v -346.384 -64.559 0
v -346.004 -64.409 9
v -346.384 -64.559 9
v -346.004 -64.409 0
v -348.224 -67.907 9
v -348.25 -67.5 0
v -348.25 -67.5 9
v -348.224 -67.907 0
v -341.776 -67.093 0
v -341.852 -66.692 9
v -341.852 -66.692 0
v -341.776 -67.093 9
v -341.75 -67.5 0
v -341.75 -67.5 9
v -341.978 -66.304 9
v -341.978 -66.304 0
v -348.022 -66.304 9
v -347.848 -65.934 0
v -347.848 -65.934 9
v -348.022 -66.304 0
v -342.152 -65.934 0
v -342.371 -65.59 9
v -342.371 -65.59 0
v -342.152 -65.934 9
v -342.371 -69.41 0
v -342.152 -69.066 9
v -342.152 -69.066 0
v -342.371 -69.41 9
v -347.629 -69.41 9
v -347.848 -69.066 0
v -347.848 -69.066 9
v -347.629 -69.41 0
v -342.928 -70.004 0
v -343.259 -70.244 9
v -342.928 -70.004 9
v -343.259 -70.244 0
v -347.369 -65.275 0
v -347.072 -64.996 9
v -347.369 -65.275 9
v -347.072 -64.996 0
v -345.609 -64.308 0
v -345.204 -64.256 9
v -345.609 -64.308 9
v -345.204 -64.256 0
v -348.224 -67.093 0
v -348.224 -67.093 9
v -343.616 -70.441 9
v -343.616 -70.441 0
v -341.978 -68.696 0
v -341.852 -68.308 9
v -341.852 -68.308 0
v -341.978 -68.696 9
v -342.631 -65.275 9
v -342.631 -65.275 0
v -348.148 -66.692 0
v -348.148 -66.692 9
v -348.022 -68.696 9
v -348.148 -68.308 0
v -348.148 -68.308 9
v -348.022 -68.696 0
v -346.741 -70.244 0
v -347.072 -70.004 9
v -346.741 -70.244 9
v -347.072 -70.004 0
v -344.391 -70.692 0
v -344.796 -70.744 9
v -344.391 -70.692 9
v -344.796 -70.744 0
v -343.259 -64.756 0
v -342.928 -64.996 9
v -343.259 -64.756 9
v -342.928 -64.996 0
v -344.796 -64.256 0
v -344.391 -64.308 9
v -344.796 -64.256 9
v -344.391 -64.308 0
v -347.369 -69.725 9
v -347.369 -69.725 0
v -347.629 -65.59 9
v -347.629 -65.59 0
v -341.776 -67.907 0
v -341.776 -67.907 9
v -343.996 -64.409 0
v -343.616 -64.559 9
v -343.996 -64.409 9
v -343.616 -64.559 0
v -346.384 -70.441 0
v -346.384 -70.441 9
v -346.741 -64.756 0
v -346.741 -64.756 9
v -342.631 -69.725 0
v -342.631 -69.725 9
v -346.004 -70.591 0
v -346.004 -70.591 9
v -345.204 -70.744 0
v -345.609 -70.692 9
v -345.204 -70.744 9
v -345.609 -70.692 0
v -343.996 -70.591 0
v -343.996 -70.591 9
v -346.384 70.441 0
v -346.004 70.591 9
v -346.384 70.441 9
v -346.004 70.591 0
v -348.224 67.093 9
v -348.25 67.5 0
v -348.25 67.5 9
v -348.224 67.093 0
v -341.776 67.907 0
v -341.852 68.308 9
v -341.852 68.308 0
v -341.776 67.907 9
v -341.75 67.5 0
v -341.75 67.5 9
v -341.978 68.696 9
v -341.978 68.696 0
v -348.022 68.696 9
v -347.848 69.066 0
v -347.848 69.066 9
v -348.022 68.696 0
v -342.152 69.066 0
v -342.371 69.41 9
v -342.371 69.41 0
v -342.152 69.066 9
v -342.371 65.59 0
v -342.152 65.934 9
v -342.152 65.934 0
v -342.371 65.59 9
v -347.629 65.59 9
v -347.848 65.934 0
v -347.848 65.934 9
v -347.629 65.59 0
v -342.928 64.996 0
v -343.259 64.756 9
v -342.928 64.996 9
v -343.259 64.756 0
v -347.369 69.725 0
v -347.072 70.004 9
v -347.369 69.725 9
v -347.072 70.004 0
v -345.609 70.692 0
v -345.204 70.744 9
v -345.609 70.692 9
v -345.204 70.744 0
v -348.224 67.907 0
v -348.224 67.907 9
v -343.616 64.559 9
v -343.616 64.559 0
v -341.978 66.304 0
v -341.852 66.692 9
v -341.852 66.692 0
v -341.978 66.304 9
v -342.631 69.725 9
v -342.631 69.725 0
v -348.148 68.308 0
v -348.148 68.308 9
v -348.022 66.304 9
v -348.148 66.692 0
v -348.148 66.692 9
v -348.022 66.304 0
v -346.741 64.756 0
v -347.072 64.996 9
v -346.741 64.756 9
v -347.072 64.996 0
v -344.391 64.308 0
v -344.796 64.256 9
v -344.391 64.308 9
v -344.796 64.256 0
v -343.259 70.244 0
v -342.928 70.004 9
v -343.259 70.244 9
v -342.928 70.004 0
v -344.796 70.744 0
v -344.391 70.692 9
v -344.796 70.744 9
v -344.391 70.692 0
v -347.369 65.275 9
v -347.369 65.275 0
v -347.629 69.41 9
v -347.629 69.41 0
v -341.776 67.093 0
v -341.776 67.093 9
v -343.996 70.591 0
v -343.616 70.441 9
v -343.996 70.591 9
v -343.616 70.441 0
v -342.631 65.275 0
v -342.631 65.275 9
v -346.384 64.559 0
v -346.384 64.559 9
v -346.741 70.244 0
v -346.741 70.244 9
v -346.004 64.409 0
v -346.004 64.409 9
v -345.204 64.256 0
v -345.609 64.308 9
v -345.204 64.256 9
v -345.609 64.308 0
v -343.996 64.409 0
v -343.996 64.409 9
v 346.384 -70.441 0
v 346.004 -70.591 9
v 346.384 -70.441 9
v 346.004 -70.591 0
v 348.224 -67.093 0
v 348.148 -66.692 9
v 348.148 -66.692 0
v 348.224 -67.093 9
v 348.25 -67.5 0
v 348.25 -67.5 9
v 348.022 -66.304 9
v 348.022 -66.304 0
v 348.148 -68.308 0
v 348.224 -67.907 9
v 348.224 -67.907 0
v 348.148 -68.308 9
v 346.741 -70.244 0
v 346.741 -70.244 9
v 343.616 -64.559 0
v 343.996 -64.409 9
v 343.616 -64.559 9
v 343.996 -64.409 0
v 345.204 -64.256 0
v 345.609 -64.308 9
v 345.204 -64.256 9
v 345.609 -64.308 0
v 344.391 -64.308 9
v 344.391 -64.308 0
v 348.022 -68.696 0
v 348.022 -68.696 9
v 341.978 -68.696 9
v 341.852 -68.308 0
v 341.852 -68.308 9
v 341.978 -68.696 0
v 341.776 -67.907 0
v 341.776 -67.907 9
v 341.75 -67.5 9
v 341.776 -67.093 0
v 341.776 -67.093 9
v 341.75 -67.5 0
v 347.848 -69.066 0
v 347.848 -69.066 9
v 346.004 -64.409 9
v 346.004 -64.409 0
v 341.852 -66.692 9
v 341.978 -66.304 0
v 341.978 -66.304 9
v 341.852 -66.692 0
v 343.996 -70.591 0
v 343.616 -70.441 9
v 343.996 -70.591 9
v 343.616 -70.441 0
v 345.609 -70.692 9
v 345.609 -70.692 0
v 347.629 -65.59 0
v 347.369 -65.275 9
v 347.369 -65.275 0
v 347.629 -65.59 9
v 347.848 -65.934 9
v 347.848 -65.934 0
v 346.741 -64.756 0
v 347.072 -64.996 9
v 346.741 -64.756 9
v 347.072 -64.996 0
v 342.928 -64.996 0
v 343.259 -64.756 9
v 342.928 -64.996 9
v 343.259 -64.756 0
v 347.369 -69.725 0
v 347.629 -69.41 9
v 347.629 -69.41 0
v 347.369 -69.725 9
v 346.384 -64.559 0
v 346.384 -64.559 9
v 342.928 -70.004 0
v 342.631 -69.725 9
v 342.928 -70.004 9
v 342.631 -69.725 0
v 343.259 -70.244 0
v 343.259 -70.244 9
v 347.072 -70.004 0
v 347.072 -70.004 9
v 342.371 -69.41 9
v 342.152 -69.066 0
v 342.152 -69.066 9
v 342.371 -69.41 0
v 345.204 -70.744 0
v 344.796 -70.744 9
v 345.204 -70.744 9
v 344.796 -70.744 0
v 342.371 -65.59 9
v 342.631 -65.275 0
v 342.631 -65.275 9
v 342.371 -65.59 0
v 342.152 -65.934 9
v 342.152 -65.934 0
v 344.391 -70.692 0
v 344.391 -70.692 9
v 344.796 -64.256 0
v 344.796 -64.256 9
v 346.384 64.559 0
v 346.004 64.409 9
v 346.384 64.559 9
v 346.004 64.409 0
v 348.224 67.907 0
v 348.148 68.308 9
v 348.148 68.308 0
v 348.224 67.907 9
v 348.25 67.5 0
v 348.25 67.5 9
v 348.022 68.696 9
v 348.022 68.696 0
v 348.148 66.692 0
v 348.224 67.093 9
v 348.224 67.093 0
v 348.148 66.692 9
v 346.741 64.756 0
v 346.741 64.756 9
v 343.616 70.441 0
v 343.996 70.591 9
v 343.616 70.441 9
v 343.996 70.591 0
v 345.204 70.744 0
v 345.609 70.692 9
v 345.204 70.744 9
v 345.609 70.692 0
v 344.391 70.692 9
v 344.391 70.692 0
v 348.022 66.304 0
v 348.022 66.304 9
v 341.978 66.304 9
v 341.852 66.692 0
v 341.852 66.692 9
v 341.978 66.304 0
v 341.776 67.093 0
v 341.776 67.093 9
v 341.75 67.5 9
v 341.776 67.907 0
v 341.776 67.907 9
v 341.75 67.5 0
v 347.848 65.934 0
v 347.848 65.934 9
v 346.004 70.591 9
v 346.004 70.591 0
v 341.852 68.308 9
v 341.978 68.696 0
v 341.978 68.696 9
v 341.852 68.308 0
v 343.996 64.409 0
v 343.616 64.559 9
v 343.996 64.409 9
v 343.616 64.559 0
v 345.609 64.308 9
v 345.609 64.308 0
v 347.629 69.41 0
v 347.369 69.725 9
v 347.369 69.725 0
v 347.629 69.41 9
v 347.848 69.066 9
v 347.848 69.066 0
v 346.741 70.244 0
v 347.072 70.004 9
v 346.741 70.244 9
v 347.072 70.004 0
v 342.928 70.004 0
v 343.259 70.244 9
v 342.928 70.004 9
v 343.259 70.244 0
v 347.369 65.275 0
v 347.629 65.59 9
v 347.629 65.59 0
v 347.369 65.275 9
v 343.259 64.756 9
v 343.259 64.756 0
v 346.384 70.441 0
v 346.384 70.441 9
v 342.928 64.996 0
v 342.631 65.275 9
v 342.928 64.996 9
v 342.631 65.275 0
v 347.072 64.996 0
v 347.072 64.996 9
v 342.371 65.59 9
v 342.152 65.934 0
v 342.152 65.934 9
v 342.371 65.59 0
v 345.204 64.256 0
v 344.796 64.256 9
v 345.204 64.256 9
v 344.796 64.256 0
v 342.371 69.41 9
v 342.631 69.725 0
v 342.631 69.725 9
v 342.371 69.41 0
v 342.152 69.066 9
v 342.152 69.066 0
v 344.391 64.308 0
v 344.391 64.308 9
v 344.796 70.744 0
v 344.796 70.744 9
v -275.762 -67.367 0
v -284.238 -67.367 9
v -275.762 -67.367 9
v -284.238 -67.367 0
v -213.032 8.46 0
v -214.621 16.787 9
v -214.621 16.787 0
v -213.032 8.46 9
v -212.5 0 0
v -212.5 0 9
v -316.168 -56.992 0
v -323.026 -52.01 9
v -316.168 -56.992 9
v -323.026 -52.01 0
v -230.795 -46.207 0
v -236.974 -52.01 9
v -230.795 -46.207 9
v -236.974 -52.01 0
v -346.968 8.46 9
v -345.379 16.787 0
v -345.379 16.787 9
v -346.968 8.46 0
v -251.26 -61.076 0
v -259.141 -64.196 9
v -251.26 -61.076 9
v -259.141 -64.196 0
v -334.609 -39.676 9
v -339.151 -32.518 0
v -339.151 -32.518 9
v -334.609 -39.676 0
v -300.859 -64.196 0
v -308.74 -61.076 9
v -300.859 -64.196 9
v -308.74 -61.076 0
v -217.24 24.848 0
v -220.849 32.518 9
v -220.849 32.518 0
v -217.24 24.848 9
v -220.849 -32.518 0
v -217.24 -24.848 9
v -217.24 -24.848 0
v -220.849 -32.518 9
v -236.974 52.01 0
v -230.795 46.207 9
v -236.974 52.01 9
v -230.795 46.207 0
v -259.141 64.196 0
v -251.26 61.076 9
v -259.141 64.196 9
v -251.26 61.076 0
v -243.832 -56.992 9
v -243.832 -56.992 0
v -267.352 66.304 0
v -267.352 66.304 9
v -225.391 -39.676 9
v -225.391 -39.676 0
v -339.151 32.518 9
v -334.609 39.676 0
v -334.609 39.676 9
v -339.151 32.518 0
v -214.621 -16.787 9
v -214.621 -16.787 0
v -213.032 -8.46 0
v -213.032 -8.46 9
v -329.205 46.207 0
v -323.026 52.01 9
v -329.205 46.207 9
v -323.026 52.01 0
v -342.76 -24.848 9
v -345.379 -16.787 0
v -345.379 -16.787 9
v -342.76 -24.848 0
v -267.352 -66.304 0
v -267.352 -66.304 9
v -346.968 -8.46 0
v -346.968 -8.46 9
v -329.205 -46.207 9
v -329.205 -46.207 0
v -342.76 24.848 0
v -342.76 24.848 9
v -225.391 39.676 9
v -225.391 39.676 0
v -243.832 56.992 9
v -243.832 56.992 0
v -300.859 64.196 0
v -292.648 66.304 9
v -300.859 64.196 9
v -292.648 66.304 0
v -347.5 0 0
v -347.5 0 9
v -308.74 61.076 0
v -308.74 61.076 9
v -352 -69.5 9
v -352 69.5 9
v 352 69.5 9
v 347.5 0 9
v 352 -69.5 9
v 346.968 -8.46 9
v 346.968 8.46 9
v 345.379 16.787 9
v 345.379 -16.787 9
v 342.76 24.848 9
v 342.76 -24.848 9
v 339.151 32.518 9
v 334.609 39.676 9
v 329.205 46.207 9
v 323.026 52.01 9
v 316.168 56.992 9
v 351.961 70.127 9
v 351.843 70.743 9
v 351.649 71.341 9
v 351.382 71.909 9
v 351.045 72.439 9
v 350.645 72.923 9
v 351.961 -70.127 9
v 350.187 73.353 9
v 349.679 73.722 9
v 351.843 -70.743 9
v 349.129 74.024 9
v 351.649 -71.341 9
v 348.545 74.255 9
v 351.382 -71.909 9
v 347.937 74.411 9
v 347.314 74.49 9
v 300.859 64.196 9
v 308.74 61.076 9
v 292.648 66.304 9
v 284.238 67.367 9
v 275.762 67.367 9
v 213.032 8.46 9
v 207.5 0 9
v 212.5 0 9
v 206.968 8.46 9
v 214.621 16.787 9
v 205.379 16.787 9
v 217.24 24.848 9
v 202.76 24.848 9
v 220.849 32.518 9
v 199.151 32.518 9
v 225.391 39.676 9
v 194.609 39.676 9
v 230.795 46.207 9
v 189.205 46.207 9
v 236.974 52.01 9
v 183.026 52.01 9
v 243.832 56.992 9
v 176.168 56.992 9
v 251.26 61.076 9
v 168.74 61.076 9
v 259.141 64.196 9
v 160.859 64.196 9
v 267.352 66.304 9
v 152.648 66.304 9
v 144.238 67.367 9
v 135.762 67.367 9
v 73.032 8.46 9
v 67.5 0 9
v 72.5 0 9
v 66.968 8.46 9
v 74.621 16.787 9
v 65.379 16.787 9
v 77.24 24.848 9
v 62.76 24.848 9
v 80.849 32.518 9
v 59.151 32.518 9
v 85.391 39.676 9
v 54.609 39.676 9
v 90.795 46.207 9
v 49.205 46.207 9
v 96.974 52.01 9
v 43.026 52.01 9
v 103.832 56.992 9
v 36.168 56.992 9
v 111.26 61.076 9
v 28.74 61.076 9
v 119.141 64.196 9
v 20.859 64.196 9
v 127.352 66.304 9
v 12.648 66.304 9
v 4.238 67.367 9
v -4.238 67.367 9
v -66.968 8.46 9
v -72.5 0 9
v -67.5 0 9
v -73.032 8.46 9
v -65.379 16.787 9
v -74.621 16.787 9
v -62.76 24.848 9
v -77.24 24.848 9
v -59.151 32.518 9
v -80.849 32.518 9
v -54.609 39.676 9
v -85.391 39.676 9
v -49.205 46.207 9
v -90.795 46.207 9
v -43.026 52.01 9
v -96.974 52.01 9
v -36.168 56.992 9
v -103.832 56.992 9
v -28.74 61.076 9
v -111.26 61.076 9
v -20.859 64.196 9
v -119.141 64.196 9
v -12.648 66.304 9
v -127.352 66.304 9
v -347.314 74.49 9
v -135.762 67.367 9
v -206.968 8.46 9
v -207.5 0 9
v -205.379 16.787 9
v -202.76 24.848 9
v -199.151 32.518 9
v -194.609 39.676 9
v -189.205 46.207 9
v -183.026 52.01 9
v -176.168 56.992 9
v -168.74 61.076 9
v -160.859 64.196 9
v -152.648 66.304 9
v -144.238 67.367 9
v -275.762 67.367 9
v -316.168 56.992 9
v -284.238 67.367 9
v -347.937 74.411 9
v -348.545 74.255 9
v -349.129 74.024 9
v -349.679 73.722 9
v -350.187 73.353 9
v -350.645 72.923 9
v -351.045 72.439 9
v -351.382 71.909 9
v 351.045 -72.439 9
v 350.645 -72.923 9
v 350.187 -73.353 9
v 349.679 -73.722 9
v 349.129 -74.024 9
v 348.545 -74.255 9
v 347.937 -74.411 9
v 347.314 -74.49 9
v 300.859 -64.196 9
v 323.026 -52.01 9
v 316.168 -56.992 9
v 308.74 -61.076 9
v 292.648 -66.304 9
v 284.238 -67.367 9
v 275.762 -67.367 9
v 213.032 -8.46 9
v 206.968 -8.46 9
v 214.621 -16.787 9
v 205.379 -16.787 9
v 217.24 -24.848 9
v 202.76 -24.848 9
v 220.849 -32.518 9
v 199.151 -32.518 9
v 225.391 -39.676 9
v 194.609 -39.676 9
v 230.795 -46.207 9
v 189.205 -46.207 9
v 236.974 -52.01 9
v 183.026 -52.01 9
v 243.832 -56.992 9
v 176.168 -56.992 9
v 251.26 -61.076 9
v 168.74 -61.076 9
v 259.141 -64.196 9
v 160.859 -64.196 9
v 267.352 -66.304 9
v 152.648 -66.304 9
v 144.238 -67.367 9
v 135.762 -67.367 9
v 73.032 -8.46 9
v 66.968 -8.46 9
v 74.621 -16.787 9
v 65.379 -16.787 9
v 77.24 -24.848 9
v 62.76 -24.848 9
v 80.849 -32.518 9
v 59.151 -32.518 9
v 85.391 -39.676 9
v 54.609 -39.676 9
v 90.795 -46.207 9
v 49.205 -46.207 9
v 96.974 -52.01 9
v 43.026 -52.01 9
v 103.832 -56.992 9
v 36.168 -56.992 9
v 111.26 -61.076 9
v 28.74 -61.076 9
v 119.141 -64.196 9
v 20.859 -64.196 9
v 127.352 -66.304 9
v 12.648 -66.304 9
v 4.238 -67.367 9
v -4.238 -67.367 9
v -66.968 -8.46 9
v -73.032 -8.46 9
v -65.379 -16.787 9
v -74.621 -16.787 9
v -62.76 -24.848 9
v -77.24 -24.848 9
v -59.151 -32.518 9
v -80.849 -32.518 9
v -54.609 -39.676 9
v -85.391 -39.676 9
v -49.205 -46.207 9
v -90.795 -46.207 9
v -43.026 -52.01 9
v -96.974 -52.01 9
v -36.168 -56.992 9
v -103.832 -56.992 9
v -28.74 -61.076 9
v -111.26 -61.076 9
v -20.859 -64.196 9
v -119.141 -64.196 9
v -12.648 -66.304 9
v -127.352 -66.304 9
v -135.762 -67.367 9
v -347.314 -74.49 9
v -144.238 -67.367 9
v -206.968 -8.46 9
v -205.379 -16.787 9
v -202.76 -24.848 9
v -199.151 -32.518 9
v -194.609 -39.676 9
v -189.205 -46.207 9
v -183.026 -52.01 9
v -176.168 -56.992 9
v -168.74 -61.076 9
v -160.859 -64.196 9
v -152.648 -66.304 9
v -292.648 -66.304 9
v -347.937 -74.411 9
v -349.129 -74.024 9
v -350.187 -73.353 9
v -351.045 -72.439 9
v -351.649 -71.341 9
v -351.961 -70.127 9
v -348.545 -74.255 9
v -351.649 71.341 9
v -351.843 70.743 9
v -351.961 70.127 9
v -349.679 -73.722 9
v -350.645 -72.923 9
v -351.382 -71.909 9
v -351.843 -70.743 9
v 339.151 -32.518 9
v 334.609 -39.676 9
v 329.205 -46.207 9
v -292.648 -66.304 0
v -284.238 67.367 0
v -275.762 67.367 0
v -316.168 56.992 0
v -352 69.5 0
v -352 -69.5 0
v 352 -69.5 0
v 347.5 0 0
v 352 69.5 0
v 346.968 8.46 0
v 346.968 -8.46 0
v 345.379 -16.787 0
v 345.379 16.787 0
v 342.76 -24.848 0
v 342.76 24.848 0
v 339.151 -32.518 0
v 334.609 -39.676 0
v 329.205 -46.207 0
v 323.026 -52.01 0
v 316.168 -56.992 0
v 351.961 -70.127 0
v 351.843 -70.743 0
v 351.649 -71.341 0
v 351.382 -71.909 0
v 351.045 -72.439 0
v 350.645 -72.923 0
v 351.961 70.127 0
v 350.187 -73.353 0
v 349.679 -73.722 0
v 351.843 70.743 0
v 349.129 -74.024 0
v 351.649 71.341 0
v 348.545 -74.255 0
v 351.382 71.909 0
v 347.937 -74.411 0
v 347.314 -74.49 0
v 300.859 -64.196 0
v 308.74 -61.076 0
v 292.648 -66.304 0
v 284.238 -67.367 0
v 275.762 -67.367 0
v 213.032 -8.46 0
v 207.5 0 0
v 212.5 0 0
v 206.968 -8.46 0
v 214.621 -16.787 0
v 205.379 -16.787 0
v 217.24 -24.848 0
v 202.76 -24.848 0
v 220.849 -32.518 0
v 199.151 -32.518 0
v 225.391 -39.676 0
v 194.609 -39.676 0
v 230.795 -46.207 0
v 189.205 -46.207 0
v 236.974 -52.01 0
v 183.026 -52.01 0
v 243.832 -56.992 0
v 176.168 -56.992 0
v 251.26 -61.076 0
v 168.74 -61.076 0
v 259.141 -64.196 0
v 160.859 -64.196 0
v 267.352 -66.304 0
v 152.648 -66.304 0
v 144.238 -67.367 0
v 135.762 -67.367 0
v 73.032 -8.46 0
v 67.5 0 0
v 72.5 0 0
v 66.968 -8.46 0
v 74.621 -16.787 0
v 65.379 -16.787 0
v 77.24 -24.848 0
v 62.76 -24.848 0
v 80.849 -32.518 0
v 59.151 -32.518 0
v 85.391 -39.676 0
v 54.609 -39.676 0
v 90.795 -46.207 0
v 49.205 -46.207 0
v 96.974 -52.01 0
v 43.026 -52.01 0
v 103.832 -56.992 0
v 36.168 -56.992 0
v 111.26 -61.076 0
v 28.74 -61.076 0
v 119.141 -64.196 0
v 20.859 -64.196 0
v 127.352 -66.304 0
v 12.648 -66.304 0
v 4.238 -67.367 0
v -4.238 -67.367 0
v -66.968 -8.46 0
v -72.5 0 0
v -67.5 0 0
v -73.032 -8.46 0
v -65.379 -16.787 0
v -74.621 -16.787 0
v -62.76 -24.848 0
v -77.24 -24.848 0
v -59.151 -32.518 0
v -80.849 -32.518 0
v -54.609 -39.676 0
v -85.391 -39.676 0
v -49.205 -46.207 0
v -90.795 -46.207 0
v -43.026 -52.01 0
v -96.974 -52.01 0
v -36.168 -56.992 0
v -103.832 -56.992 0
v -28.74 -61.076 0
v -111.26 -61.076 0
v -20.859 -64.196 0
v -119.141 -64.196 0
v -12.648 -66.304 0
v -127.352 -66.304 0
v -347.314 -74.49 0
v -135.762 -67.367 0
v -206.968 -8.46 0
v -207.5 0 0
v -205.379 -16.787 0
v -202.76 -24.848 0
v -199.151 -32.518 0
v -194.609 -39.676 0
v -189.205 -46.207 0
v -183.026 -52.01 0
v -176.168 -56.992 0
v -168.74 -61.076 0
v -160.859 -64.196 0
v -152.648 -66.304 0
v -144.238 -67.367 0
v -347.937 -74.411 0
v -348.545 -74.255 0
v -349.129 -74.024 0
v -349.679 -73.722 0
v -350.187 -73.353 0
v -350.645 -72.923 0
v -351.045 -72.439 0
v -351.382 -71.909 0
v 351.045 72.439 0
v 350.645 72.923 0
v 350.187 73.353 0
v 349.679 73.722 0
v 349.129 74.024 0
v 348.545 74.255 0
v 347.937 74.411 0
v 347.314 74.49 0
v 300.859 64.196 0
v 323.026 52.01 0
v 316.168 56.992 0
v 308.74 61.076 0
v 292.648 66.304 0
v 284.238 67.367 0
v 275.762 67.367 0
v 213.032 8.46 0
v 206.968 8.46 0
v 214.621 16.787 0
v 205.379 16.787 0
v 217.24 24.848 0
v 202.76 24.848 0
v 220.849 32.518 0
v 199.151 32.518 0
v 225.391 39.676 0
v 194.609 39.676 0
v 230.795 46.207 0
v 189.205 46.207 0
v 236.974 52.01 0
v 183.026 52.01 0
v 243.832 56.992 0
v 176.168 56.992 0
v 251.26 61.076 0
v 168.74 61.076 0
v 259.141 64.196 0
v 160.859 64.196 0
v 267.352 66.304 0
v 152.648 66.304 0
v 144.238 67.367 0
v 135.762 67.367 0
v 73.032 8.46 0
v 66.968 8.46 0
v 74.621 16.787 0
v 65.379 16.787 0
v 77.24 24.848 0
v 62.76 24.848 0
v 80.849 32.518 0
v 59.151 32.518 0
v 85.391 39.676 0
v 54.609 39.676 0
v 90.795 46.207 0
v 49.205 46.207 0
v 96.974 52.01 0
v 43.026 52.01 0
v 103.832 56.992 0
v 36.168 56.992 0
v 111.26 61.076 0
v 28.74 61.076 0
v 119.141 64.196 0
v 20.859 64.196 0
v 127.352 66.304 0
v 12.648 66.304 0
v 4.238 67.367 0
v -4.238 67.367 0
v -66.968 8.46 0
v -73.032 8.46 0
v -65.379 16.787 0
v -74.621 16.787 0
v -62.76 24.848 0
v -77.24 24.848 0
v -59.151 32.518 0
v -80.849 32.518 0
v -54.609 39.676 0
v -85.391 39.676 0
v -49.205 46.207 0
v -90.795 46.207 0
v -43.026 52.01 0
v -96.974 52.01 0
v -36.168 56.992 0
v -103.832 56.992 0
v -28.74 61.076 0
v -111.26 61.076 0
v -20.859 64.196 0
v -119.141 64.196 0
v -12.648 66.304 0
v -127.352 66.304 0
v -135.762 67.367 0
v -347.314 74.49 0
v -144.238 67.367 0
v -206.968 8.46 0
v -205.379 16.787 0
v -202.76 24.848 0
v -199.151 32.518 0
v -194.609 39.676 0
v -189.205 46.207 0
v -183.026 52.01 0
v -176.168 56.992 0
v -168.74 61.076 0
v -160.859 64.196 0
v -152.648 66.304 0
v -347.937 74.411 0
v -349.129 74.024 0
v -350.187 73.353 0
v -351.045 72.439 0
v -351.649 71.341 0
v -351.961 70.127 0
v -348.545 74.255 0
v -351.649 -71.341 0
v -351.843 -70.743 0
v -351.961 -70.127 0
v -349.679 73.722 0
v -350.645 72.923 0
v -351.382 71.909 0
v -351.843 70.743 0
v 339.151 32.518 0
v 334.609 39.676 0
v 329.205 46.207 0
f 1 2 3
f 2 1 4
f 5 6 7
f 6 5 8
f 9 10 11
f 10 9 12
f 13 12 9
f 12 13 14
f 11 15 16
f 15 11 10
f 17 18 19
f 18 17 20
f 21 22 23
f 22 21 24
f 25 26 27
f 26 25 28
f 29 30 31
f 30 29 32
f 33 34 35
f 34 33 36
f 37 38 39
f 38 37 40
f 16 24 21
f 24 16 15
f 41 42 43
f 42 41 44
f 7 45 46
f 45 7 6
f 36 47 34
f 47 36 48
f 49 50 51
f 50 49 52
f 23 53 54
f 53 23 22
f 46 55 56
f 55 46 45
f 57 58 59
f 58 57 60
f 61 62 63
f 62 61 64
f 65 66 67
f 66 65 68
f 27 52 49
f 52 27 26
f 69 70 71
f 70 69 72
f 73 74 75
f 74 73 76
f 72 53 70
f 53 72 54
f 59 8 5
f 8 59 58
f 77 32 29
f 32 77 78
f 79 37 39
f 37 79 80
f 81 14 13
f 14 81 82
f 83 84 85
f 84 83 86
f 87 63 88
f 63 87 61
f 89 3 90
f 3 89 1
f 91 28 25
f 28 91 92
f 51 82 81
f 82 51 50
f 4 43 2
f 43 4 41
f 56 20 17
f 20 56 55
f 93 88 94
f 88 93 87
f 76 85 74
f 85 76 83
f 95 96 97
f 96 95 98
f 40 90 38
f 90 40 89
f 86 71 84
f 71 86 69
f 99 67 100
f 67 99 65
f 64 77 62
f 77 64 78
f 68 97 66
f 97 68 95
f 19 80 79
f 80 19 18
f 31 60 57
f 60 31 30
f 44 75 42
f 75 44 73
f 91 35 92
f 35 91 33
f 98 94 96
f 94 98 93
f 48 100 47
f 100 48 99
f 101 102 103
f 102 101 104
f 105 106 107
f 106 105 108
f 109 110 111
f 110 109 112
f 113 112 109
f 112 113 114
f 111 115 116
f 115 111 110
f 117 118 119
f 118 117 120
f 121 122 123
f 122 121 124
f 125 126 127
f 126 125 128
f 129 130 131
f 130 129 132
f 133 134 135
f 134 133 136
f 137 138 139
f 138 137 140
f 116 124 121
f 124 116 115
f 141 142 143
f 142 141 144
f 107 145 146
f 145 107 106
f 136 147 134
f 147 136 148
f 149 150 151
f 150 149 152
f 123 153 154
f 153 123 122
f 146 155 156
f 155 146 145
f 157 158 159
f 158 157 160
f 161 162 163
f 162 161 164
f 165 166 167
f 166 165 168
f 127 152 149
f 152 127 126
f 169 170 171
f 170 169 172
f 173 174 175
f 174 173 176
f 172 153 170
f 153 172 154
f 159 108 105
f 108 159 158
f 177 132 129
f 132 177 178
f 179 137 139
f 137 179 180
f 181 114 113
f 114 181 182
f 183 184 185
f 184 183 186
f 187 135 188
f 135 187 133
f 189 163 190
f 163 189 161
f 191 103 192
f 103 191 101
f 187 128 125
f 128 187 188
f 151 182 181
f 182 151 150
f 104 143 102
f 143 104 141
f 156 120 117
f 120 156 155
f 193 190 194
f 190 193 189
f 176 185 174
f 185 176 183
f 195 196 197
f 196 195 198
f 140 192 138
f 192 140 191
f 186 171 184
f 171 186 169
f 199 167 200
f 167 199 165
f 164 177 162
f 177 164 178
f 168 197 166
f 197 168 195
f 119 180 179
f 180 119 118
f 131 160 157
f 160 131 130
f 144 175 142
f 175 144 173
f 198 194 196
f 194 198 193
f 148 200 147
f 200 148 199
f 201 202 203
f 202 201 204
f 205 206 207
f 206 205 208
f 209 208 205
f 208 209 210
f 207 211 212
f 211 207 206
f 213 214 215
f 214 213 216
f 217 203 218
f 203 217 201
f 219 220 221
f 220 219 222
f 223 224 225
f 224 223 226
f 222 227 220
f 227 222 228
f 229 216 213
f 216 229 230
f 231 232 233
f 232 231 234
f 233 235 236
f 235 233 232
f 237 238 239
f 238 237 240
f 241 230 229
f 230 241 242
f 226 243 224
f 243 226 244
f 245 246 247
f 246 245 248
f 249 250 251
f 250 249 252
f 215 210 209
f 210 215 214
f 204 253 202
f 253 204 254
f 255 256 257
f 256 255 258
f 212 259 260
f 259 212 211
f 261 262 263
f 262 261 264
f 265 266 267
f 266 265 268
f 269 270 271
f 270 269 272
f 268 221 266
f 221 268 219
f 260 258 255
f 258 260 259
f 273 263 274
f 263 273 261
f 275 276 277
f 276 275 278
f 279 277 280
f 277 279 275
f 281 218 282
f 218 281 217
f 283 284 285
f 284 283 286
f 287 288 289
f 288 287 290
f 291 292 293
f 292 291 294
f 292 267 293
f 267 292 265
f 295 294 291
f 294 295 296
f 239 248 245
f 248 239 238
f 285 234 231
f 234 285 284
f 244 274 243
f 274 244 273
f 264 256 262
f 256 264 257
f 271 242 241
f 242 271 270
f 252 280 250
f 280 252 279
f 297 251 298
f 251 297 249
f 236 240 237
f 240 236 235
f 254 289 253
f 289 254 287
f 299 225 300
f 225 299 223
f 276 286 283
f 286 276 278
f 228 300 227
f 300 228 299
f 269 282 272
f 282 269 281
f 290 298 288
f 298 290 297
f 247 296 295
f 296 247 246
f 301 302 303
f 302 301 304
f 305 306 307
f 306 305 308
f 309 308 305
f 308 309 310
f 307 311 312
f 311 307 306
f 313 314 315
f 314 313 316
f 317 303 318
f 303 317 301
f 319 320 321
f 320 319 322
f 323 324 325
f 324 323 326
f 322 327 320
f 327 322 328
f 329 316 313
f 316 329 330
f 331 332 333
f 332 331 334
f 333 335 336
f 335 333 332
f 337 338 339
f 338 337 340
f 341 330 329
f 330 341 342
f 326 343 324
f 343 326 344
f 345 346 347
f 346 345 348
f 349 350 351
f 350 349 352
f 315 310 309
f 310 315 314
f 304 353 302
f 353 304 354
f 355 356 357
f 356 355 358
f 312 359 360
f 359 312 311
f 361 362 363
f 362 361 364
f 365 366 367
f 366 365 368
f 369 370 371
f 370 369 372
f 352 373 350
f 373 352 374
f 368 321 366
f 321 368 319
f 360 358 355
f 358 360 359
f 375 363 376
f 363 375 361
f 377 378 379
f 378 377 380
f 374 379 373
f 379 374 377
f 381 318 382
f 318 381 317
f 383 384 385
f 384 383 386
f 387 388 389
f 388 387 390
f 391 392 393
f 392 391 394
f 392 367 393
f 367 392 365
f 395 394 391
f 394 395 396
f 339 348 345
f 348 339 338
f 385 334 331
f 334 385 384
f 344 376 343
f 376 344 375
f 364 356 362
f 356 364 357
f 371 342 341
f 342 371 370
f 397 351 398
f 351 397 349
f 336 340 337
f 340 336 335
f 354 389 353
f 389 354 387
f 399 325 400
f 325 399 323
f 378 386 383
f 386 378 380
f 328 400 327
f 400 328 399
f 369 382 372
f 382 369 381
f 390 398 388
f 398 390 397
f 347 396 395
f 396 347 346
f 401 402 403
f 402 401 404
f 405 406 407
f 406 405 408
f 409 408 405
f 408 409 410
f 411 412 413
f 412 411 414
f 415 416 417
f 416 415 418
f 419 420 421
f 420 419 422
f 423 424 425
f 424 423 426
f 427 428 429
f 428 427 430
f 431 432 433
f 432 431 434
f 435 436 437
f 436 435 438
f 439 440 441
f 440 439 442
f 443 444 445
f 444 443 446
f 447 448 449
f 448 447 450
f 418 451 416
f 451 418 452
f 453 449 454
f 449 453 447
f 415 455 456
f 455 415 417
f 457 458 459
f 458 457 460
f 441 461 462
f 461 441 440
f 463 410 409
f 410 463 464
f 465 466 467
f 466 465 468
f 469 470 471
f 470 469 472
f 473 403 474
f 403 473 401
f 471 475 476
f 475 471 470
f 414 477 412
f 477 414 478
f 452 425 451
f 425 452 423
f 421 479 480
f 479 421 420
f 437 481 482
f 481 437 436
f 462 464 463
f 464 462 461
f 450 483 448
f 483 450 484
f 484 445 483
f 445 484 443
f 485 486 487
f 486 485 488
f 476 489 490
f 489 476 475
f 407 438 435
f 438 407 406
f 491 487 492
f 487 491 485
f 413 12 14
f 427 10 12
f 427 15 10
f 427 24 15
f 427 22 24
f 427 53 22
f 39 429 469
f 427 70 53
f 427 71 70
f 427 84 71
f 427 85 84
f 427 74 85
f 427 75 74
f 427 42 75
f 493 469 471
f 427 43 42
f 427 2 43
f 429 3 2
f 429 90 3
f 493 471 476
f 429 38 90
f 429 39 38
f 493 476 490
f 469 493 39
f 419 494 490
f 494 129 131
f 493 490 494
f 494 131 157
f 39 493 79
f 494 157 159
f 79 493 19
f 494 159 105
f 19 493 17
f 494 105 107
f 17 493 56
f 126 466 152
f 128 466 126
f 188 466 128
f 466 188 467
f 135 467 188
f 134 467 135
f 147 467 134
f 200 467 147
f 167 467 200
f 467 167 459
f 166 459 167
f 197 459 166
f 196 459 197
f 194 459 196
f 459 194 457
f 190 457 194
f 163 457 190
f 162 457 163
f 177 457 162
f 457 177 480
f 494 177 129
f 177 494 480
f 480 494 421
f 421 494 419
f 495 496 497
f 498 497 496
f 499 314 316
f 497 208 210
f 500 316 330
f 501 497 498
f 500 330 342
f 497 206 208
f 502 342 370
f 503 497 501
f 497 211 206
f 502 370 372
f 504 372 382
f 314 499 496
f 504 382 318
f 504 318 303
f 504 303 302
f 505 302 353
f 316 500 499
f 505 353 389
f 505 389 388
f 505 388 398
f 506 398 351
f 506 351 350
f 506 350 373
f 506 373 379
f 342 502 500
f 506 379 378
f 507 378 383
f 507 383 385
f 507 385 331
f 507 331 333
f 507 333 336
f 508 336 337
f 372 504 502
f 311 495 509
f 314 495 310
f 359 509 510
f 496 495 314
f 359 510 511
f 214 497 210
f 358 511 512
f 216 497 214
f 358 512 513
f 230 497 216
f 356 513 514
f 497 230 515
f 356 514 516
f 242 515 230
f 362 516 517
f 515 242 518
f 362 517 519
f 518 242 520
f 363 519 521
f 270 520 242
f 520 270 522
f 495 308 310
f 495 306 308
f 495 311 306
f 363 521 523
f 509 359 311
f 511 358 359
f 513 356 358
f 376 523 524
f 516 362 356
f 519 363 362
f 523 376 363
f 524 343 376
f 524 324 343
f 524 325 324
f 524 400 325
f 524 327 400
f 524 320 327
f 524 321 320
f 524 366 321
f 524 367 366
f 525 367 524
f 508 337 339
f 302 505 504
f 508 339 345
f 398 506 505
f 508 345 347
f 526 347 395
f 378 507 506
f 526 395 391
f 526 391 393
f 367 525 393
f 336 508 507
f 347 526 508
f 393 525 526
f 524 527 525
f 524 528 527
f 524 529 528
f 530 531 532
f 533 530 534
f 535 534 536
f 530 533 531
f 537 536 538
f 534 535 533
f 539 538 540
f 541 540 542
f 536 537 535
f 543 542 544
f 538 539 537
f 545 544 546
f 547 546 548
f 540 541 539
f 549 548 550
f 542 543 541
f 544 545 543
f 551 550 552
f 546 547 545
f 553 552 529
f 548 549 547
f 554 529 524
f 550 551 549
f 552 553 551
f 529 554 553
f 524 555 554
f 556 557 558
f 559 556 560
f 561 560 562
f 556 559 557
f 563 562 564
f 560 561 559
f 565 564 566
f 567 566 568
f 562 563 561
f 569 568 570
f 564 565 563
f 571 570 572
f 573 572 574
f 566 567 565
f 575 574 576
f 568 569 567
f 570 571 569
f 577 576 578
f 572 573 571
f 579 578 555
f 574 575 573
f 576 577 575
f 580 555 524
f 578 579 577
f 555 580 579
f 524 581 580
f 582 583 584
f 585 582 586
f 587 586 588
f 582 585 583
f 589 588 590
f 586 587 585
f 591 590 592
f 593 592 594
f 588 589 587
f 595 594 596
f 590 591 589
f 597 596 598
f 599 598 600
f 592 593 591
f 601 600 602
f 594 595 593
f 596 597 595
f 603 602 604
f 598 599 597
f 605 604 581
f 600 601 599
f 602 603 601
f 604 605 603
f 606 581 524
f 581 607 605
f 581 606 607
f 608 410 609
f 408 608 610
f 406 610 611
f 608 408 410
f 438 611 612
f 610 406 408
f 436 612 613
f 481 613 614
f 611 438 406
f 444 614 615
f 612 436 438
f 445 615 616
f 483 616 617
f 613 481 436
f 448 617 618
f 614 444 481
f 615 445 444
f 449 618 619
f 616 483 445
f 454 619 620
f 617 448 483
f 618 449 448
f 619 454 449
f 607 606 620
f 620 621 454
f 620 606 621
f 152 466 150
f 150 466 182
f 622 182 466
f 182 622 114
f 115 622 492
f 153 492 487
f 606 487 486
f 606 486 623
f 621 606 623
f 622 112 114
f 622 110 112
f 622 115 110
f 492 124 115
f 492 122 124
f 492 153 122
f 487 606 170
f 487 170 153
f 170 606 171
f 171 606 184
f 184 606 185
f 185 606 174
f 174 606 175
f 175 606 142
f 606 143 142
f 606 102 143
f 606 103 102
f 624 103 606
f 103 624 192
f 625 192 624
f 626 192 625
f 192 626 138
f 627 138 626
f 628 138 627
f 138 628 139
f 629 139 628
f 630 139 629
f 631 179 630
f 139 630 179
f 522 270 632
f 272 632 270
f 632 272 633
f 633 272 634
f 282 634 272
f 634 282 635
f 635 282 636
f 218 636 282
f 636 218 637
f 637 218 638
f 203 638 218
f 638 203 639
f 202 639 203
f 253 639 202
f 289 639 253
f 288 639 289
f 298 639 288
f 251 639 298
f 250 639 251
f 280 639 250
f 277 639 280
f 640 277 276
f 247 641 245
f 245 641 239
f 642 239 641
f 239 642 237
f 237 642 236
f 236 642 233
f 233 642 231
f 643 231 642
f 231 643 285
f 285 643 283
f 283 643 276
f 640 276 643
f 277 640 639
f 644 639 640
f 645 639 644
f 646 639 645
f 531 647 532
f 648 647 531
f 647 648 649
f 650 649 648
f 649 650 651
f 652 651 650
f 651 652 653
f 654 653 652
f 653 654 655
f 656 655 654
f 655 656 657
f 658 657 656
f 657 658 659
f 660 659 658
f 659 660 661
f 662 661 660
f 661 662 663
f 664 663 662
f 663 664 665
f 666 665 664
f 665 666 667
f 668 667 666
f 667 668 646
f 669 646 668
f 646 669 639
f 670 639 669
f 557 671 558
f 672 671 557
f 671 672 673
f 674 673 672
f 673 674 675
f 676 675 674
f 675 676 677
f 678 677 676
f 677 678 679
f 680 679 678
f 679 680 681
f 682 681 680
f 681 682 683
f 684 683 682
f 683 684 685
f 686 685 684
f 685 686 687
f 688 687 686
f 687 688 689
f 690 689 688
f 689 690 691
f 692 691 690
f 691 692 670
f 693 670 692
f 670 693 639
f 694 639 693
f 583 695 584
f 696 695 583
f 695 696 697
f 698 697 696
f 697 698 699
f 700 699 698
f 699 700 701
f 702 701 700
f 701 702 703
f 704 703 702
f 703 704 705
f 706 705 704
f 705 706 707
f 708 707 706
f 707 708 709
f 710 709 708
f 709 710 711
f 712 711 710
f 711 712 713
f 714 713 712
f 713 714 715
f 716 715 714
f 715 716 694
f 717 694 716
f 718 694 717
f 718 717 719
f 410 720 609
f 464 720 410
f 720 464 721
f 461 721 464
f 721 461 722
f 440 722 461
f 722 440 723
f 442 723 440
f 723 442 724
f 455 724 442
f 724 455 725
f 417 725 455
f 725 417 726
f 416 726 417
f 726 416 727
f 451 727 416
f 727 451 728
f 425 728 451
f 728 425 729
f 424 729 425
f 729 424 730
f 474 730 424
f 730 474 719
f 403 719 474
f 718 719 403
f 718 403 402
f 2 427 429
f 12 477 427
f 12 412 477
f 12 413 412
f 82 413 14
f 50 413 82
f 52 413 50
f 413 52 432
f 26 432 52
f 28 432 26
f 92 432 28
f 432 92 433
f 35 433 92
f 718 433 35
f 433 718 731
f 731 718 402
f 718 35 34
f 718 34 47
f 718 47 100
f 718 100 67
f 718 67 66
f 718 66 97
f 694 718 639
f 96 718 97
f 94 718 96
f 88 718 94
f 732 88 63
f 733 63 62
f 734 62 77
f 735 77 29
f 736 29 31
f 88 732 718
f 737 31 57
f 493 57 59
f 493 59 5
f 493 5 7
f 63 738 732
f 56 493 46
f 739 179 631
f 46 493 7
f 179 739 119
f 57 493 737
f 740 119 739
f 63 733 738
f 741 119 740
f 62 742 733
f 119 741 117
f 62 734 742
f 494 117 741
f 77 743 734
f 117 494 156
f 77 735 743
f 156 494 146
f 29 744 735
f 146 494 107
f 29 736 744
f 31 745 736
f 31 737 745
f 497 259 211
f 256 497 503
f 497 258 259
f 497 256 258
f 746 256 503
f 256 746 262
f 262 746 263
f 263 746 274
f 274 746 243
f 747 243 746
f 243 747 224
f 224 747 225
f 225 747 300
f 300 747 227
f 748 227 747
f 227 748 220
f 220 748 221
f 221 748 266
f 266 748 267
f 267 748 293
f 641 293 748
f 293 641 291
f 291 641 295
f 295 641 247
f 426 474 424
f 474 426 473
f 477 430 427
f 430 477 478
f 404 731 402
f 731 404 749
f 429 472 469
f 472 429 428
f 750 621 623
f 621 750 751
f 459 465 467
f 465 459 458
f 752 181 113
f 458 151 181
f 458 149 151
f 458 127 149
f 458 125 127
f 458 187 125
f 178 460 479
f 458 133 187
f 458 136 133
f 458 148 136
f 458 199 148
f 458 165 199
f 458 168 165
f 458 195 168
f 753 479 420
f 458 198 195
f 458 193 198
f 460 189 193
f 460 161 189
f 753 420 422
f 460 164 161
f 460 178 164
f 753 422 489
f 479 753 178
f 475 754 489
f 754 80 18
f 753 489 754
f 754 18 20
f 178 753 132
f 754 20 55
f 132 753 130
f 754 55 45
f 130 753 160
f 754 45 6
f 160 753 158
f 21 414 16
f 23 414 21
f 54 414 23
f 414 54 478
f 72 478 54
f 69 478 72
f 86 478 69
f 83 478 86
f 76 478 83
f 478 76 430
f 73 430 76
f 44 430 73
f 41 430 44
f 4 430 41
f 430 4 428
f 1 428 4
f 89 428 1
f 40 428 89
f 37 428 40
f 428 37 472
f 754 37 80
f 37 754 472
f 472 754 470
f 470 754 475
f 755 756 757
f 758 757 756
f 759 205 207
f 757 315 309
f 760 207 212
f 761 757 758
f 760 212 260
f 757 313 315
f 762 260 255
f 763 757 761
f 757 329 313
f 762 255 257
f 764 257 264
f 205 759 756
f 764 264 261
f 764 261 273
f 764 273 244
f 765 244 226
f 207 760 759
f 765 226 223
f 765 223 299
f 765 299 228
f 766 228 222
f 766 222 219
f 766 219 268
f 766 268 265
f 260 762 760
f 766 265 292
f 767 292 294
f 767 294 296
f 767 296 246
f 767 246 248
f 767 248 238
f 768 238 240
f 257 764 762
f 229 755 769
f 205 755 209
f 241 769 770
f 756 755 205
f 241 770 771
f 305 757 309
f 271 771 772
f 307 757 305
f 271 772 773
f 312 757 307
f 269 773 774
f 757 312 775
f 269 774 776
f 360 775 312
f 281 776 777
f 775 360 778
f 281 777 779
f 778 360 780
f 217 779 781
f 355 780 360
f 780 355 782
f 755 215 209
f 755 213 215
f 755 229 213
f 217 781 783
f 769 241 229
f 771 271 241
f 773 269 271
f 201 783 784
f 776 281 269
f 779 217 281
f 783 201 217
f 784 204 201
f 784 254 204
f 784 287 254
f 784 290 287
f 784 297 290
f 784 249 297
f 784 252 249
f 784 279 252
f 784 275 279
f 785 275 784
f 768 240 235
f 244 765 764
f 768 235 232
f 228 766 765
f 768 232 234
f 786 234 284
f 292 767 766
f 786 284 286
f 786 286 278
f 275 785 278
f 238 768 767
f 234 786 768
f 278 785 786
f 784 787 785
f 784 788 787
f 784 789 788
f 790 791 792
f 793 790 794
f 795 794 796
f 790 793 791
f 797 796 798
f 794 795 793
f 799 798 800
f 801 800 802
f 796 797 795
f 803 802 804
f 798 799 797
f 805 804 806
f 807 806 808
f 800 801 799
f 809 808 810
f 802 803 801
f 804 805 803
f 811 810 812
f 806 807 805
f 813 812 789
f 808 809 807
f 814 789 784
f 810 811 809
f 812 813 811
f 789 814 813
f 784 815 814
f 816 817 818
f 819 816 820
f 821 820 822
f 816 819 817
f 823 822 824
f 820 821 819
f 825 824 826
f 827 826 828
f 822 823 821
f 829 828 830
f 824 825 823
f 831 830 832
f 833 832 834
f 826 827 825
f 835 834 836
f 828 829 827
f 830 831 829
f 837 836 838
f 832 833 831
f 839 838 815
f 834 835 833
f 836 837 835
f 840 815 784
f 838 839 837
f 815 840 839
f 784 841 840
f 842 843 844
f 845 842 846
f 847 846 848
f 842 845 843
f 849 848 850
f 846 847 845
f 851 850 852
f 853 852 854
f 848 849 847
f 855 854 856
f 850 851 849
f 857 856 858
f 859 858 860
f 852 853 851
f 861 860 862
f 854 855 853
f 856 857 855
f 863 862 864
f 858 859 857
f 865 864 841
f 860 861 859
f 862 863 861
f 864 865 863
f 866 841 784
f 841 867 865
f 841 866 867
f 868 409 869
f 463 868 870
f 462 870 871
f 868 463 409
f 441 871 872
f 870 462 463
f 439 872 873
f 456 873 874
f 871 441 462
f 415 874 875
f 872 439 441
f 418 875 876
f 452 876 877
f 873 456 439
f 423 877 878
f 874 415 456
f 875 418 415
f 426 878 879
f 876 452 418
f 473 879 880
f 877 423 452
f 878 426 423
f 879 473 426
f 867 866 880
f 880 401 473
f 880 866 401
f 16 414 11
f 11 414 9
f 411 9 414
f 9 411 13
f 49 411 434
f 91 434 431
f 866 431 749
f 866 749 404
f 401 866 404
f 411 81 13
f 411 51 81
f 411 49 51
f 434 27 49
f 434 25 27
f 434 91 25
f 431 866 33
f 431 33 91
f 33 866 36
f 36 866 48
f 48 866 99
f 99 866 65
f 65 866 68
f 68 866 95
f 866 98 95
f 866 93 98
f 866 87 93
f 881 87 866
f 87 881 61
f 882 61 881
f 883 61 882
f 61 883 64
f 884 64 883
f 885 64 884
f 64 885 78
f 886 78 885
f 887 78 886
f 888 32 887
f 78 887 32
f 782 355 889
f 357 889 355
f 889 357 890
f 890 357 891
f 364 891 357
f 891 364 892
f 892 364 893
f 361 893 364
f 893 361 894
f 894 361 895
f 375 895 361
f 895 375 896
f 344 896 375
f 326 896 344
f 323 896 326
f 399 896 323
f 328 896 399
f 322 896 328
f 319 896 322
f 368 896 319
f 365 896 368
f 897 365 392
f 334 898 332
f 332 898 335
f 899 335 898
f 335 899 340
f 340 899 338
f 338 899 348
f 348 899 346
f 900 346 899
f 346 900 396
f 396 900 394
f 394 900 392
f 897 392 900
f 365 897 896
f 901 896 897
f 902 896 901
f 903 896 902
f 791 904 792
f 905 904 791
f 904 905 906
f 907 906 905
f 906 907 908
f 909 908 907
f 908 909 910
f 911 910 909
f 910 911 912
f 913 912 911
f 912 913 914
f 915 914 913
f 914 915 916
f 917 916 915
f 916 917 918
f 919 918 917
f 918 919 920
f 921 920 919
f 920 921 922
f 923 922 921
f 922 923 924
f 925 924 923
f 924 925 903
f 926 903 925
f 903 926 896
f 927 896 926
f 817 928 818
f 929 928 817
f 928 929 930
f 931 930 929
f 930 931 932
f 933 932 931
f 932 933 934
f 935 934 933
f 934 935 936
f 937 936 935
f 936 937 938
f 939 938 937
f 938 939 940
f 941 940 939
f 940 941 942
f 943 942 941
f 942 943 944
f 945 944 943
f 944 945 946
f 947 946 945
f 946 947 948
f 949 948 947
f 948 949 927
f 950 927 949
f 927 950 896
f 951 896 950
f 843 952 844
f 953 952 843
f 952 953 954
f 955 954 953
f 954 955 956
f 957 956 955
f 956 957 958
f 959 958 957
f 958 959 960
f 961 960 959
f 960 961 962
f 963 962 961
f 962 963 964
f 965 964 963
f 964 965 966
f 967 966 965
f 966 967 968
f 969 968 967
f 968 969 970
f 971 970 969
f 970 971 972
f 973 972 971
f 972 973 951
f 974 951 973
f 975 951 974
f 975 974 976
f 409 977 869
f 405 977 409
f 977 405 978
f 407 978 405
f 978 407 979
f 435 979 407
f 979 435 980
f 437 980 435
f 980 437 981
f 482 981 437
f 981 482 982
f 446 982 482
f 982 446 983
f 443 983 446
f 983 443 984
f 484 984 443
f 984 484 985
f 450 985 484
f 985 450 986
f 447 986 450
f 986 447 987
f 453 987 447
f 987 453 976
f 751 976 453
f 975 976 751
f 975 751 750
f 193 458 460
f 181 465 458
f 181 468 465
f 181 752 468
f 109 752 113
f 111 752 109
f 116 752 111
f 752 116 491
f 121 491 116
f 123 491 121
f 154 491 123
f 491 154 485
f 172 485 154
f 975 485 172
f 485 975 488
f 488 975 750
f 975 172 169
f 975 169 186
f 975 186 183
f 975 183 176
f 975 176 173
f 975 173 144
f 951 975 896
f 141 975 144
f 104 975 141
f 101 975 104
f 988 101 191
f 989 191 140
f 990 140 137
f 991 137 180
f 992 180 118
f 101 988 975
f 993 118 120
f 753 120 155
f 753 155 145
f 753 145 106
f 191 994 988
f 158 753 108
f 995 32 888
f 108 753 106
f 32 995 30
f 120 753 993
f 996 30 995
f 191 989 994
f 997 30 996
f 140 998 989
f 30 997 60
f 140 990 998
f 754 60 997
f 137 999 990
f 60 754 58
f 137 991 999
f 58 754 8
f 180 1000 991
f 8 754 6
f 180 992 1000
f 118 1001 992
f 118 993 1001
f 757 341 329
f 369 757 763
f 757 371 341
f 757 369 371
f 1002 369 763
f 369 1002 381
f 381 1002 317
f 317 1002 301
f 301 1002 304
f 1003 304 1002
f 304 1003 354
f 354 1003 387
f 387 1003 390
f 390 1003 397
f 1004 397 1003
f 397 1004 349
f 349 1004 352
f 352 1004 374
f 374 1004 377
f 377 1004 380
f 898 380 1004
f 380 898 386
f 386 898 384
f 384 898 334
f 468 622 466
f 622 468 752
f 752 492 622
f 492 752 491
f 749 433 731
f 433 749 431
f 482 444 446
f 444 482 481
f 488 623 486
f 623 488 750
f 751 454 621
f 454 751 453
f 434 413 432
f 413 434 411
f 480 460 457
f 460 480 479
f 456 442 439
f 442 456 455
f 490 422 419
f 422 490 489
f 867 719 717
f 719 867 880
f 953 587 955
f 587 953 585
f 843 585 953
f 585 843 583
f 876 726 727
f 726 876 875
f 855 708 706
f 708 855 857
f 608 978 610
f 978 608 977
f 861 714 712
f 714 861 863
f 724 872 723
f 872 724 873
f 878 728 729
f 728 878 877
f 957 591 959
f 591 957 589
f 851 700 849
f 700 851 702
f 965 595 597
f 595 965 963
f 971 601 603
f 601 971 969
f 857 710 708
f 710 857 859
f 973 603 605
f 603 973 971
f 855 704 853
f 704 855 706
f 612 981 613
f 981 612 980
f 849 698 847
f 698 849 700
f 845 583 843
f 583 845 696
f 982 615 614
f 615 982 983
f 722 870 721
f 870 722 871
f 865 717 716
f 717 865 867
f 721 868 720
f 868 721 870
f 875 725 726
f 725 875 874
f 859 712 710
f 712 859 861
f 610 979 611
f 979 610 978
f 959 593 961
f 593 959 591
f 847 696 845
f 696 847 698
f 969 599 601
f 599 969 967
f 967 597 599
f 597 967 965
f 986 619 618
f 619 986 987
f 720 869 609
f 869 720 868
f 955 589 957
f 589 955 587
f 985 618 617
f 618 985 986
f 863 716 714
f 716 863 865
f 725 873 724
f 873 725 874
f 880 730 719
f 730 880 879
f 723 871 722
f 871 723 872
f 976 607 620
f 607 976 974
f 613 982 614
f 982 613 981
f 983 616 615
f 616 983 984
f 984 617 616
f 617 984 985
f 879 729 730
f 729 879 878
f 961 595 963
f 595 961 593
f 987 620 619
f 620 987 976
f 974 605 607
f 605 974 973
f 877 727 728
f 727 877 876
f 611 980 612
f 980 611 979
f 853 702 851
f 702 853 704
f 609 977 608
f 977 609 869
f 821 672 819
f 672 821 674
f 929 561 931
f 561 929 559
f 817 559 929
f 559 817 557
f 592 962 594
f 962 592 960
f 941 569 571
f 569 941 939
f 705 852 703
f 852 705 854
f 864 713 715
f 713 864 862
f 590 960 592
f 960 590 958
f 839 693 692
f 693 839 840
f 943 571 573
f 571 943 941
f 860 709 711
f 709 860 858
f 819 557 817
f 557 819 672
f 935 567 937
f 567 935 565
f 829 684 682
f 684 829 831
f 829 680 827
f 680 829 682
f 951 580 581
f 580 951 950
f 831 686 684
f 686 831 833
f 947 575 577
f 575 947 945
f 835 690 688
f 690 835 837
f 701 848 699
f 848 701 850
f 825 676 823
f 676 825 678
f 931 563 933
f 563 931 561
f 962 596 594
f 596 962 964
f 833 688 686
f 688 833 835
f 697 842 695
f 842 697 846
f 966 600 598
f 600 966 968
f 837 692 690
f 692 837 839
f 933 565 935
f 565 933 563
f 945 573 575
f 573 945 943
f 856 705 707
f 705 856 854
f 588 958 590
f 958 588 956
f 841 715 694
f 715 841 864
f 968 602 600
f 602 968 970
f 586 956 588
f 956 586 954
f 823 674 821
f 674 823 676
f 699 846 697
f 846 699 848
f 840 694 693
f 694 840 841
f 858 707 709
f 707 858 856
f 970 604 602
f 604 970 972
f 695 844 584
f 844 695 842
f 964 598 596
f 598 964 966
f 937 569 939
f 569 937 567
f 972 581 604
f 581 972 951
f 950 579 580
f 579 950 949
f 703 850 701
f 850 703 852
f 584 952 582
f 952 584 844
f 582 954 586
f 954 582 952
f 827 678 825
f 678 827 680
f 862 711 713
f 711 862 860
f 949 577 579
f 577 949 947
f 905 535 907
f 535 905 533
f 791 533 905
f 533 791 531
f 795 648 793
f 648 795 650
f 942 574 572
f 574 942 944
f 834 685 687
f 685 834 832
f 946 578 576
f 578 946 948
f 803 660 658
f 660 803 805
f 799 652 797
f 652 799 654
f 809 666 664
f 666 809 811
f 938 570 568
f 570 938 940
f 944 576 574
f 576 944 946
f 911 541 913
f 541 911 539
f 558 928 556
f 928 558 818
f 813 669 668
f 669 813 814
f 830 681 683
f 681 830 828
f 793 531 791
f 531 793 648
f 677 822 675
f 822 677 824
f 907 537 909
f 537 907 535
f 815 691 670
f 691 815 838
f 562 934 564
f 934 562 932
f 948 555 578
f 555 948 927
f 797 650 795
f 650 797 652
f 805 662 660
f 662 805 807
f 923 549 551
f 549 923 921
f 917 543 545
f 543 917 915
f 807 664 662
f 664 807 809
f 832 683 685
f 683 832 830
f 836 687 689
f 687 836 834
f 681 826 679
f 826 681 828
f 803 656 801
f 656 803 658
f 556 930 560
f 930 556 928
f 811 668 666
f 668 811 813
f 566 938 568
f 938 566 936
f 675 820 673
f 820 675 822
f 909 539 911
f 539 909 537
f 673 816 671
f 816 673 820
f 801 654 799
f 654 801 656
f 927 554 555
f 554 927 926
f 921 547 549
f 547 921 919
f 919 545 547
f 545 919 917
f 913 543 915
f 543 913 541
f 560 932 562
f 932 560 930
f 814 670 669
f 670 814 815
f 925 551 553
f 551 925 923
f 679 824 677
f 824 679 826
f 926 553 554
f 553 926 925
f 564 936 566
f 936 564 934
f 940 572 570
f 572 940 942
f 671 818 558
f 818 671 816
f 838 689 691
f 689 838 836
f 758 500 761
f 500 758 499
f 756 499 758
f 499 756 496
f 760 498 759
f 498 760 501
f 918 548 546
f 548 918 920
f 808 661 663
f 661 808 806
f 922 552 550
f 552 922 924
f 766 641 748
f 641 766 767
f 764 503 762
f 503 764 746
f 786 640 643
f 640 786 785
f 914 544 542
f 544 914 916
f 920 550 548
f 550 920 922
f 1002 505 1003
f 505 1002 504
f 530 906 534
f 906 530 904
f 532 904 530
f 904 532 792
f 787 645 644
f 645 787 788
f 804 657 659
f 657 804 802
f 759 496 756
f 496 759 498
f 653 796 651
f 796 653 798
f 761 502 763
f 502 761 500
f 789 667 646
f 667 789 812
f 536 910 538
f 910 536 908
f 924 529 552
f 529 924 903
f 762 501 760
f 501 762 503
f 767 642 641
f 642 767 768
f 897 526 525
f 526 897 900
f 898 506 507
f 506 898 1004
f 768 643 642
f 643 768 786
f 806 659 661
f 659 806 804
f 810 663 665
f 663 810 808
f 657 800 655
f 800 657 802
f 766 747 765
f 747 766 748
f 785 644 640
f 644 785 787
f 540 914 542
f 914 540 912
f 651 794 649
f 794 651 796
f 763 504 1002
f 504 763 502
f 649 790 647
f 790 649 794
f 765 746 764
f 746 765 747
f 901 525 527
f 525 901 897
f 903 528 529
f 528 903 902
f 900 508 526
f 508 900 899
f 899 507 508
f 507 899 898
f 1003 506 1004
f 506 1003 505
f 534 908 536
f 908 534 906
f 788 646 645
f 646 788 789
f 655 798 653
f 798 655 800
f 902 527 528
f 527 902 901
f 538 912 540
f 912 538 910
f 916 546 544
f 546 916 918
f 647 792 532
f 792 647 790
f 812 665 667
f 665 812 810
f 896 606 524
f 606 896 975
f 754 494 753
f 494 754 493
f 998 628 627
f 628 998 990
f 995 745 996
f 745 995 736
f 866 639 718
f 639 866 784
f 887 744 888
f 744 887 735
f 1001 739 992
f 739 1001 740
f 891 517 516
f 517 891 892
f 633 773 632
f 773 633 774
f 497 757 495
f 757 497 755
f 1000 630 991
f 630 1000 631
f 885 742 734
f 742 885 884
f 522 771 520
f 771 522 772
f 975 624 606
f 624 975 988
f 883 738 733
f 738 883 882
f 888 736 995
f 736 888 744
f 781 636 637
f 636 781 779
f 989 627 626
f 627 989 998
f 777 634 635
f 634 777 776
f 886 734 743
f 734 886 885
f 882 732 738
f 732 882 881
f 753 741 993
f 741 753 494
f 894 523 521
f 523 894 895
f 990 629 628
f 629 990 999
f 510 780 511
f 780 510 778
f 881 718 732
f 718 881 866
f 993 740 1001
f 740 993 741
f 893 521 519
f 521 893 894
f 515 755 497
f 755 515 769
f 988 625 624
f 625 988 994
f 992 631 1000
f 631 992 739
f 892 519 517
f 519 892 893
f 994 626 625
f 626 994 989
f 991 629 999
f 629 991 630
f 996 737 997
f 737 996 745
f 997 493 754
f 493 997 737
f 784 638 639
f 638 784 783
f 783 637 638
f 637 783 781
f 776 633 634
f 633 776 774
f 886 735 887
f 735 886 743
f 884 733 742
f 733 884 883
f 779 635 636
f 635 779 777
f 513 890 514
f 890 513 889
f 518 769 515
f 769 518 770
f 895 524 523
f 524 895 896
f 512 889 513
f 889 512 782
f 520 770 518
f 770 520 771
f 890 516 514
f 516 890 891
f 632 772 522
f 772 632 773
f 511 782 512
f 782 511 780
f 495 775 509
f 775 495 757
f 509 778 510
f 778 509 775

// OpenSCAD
$fn = 50;


difference() {
	union() {
		hull() {
			translate(v = [-347.0000000000, 69.5000000000, 0]) {
				cylinder(h = 9, r = 5);
			}
			translate(v = [347.0000000000, 69.5000000000, 0]) {
				cylinder(h = 9, r = 5);
			}
			translate(v = [-347.0000000000, -69.5000000000, 0]) {
				cylinder(h = 9, r = 5);
			}
			translate(v = [347.0000000000, -69.5000000000, 0]) {
				cylinder(h = 9, r = 5);
			}
		}
	}
	union() {
		#translate(v = [-345.0000000000, -67.5000000000, -100.0000000000]) {
			cylinder(h = 200, r = 3.2500000000);
		}
		#translate(v = [-345.0000000000, 67.5000000000, -100.0000000000]) {
			cylinder(h = 200, r = 3.2500000000);
		}
		#translate(v = [345.0000000000, -67.5000000000, -100.0000000000]) {
			cylinder(h = 200, r = 3.2500000000);
		}
		#translate(v = [345.0000000000, 67.5000000000, -100.0000000000]) {
			cylinder(h = 200, r = 3.2500000000);
		}
		#translate(v = [-280.0000000000, 0, 0]) {
			cylinder(h = 9, r = 67.5000000000);
		}
		#translate(v = [-140.0000000000, 0, 0]) {
			cylinder(h = 9, r = 67.5000000000);
		}
		#cylinder(h = 9, r = 67.5000000000);
		#translate(v = [140.0000000000, 0, 0]) {
			cylinder(h = 9, r = 67.5000000000);
		}
		#translate(v = [280.0000000000, 0, 0]) {
			cylinder(h = 9, r = 67.5000000000);
		}
	}
}
